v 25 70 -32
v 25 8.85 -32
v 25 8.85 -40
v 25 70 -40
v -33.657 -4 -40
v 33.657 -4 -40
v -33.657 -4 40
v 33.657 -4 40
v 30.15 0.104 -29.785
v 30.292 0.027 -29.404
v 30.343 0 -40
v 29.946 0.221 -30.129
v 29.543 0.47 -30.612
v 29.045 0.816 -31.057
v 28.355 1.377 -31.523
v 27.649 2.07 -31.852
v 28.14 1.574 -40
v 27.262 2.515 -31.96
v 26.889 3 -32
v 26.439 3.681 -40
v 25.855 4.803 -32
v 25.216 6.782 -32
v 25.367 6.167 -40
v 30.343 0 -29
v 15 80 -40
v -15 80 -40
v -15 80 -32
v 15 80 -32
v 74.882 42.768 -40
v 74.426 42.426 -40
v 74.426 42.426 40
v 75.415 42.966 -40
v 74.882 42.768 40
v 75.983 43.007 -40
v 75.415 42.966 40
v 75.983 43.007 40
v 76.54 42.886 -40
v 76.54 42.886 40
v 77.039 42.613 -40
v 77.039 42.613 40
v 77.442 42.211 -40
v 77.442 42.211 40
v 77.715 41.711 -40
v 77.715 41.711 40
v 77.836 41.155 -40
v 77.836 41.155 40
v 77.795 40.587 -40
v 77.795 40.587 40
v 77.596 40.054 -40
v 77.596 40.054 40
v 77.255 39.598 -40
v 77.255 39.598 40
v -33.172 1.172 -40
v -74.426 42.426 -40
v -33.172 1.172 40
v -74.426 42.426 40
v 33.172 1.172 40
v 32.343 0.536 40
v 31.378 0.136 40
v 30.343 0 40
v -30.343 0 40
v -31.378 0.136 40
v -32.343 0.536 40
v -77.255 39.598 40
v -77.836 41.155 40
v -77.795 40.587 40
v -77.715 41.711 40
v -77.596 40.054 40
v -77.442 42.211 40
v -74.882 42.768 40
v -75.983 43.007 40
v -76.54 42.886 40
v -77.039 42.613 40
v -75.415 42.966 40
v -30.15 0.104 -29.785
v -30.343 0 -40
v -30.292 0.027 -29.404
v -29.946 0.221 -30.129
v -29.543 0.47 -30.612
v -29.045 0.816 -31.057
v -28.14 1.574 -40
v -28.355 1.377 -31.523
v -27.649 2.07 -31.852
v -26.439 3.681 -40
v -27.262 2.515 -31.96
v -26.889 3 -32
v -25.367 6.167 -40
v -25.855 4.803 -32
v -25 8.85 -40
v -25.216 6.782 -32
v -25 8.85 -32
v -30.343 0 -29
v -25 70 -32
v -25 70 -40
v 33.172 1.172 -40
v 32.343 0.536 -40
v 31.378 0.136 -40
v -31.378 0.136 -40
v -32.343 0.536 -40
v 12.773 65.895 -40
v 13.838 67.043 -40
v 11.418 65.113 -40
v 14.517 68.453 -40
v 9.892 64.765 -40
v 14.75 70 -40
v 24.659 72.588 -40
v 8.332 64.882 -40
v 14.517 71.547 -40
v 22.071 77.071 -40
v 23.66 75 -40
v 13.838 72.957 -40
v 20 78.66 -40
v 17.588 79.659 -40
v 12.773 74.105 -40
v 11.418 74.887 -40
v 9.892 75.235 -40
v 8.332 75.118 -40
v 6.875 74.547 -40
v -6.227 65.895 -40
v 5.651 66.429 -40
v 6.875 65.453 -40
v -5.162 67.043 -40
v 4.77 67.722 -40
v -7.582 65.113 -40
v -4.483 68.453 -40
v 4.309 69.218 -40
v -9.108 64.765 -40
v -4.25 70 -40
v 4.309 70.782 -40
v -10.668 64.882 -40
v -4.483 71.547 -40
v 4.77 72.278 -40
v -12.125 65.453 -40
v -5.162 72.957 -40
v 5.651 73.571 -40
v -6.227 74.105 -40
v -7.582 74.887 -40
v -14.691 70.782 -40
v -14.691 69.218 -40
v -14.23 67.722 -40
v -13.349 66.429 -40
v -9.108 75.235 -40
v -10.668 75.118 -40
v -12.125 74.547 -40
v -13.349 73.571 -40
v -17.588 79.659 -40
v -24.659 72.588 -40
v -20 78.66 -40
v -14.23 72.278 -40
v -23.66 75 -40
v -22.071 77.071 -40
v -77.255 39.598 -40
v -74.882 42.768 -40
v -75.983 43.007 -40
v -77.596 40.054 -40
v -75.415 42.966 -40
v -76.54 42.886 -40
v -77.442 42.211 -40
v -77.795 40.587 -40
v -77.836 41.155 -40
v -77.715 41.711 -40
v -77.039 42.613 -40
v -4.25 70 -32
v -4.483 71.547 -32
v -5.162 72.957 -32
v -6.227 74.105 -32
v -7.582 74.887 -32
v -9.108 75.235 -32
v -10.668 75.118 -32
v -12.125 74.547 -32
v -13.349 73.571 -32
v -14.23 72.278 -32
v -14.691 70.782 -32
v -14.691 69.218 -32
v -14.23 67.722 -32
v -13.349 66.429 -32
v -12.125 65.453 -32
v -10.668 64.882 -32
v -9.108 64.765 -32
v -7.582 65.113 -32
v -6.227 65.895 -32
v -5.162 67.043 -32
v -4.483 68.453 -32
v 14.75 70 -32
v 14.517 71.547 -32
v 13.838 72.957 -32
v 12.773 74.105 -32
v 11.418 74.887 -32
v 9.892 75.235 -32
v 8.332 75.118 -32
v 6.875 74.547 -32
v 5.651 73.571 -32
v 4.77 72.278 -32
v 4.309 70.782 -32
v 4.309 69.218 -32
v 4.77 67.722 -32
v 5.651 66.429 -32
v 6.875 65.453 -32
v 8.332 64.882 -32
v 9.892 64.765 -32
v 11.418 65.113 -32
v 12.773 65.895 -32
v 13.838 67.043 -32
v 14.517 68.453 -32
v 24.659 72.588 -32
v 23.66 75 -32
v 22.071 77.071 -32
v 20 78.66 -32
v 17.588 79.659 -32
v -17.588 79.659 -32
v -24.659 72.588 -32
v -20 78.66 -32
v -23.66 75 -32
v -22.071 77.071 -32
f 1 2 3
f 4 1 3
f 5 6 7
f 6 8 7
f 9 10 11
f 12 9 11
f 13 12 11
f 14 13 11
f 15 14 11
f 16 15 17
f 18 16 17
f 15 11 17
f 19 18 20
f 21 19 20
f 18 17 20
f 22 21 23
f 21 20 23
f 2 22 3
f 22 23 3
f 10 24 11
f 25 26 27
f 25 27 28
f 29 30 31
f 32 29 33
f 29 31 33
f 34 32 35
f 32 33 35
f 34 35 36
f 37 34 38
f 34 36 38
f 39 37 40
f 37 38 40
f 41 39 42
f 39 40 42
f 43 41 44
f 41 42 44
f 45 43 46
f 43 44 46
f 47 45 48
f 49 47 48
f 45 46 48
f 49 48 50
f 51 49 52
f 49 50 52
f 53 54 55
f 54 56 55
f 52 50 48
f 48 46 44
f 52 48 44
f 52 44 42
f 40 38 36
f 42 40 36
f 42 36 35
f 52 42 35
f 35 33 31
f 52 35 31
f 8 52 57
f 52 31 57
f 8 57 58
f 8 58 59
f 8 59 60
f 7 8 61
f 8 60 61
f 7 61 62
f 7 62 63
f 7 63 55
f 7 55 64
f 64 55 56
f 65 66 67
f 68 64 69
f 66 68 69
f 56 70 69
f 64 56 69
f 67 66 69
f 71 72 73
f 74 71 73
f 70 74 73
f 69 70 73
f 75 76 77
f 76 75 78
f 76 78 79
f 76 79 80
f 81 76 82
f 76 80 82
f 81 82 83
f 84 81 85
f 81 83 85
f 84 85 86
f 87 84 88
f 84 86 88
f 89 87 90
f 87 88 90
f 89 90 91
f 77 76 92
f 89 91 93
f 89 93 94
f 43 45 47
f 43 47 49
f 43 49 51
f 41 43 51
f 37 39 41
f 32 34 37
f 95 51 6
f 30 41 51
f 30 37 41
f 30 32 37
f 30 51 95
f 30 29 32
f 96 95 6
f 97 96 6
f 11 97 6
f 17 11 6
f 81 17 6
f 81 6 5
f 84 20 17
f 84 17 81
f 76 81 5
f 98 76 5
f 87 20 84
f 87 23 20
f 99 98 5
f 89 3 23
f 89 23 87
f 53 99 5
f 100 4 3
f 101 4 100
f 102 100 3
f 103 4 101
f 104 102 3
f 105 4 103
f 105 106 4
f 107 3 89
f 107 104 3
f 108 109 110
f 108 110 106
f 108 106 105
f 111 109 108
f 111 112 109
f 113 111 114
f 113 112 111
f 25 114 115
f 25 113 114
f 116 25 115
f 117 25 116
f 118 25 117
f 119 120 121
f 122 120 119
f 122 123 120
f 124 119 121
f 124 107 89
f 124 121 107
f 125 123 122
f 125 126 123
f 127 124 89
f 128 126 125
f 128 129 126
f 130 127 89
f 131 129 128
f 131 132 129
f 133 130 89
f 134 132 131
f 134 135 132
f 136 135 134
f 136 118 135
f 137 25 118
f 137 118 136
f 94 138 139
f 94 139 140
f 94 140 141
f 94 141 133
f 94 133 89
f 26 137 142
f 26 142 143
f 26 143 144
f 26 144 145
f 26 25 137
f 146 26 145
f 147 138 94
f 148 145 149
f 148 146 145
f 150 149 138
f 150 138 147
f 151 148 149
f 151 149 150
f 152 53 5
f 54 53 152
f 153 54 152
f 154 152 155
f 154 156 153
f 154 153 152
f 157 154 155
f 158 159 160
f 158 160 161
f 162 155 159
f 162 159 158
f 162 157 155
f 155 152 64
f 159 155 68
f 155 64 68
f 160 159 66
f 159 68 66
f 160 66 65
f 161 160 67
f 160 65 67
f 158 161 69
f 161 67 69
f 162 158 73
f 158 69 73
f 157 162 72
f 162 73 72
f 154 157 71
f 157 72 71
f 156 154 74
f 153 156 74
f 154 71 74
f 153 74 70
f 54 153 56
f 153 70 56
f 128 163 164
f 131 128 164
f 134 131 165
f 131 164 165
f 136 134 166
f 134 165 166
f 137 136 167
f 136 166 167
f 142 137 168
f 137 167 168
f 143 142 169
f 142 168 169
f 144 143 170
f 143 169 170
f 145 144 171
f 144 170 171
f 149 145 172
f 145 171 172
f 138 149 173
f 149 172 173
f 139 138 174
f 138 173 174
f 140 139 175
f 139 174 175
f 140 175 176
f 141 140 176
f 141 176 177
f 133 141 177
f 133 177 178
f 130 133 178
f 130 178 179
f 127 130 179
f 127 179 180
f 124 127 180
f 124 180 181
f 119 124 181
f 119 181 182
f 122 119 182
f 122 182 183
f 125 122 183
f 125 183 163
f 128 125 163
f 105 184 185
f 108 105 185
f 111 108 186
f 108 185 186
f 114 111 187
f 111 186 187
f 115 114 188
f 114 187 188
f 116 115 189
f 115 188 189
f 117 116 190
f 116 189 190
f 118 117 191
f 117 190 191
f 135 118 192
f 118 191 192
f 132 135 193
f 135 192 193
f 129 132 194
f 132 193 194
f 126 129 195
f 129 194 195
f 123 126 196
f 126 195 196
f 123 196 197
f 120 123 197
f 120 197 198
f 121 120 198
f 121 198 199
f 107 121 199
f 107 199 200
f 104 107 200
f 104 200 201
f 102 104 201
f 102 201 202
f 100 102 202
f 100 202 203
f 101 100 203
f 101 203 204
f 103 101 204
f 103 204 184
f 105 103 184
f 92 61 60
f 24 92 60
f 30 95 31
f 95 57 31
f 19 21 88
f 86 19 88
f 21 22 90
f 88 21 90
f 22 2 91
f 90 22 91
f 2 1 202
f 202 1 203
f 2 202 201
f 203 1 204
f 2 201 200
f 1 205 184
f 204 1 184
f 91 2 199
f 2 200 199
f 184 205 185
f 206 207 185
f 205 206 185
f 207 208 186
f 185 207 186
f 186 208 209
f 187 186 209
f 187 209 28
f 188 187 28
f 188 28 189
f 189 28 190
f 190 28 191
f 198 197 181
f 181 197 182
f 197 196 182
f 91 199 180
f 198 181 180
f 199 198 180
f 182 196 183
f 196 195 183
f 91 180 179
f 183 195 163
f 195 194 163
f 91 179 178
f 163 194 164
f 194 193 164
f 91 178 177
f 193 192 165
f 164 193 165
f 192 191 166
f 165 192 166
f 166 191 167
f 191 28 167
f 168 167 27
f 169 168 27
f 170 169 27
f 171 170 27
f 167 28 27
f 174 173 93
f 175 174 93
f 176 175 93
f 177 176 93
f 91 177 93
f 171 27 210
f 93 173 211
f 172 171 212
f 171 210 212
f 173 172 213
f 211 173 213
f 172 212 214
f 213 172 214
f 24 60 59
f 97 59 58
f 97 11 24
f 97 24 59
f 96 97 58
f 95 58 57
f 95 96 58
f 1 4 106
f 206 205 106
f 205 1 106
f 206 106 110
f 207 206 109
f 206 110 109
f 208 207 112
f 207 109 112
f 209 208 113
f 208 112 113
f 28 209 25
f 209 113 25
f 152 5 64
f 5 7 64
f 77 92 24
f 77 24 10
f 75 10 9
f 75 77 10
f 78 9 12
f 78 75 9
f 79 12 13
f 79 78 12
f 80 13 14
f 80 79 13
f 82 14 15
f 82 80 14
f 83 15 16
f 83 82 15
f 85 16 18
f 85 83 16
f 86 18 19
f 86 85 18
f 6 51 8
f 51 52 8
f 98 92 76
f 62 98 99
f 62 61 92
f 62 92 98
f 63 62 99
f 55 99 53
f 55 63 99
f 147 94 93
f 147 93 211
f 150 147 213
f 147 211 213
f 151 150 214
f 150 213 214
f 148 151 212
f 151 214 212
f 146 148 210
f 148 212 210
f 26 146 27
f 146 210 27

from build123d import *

# Parameters (mm, degrees)
BOSS_EXTRUDE2_DEPTH = 40
FILLET1_R           = 4
SKETCH3_W           = 50
SKETCH3_H           = 8
BOSS_EXTRUDE3_DEPTH = 80
SKETCH5_R           = 5.25
CUT_EXTRUDE1_DEPTH  = 133.827565624
FILLET2_R           = 10
FILLET3_R           = 3


with BuildPart() as part:
    # Sketch2 → Boss-Extrude2 (new, symmetric)
    with BuildSketch(Plane.XY):
        with BuildLine():
            Line((-32, 0), (32, 0))
            Line((32, 0), (74.426406871, 42.426406871))
            ThreePointArc((74.426406871, 42.426406871), (77.254833996, 42.426406871), (77.254833996, 39.597979746))
            Line((77.254833996, 39.597979746), (33.656854249, -4))
            Line((33.656854249, -4), (-33.656854249, -4))
            Line((-33.656854249, -4), (-77.254833996, 39.597979746))
            ThreePointArc((-77.254833996, 39.597979746), (-77.254833996, 42.426406871), (-74.426406871, 42.426406871))
            Line((-74.426406871, 42.426406871), (-32, 0))
        make_face()
    extrude(amount=BOSS_EXTRUDE2_DEPTH, both=True)

    # Fillet1
    fillet1_edges = [part.edges().sort_by_distance(p)[0] for p in [
        (-32, 0, 0),
        (32, 0, 0),
    ]]
    fillet(fillet1_edges, radius=FILLET1_R)

    # Sketch3 → Boss-Extrude3 (add)
    with BuildSketch(Plane(origin=(0, 0, 0), x_dir=(1, 0, 0), z_dir=(0, 1, 0))):
        with Locations((0, 36)):
            Rectangle(SKETCH3_W, SKETCH3_H)
    extrude(amount=BOSS_EXTRUDE3_DEPTH)

    # Sketch5 → Cut-Extrude1 (cut, through all)
    with BuildSketch(Plane.XY.offset(-32)):
        with Locations((-9.5, 70)):
            Circle(SKETCH5_R)
        with Locations((9.5, 70)):
            Circle(SKETCH5_R)
    extrude(amount=-CUT_EXTRUDE1_DEPTH, mode=Mode.SUBTRACT)

    # Fillet2
    # the kernel refuses this fillet: 10 mm, written as the material it adds along each edge
    with BuildSketch(Plane(origin=(25, 0, -40), x_dir=(1, 0, 0), z_dir=(0, 0, 1)), Plane(origin=(-25, 0, -32), x_dir=(-1, 0, 0), z_dir=(0, 0, -1))) as fillet2_piece_1:
        with BuildLine():
            CenterArc((10, 8.849503291), FILLET2_R, 180, 62.245409403)
            Line((0, 8.849503291), (0, 0))
            Line((0, 0), (5.343145751, 0))
        make_face()
    extrude(amount=8)
    # the kernel refuses this fillet: 10 mm, written as the material it takes off along each edge
    with BuildSketch(Plane(origin=(25, 80, -65), x_dir=(-1, 0, 0), z_dir=(0, 0, 1))) as fillet2_2_piece_1:
        with BuildLine():
            CenterArc((FILLET2_R, FILLET2_R), FILLET2_R, 180, 90)
            Line((0, FILLET2_R), (0, 0))
            Line((0, 0), (FILLET2_R, 0))
        make_face()
    extrude(amount=58, mode=Mode.SUBTRACT)
    with BuildSketch(Plane(origin=(-25, 80, -7), x_dir=(0, -1, 0), z_dir=(0, 0, -1))) as fillet2_2_piece_2:
        with BuildLine():
            CenterArc((FILLET2_R, -FILLET2_R), FILLET2_R, 90, 90)
            Line((0, -FILLET2_R), (0, 0))
            Line((0, 0), (FILLET2_R, 0))
        make_face()
    extrude(amount=58, mode=Mode.SUBTRACT)

    # Fillet3
    # the kernel refuses this fillet: 3 mm, written as the material it adds along each edge
    with BuildSketch(Plane(origin=(-37.843145751, 0, -32), x_dir=(0, 1, 0), z_dir=(1, 0, 0))) as fillet3_piece_1_section:
        with BuildLine():
            CenterArc((FILLET3_R, FILLET3_R), FILLET3_R, 180, 90)
            Line((0, FILLET3_R), (0, 0))
            Line((0, 0), (FILLET3_R, 0))
        make_face()
    fillet3_piece_1 = extrude(amount=75.686291501, mode=Mode.PRIVATE)
    fillet3_piece_1 = fillet3_piece_1 - Plane(origin=(35, 8.849503291, -32), x_dir=(1, 0, 0), z_dir=(0, 0, -1)) * Cylinder(10, 164, mode=Mode.PRIVATE)
    fillet3_piece_1 = fillet3_piece_1 - Plane(origin=(-35, 8.849503291, -32), x_dir=(-1, 0, 0), z_dir=(0, 0, 1)) * Cylinder(10, 164, mode=Mode.PRIVATE)
    add(fillet3_piece_1)


solid = part.part
